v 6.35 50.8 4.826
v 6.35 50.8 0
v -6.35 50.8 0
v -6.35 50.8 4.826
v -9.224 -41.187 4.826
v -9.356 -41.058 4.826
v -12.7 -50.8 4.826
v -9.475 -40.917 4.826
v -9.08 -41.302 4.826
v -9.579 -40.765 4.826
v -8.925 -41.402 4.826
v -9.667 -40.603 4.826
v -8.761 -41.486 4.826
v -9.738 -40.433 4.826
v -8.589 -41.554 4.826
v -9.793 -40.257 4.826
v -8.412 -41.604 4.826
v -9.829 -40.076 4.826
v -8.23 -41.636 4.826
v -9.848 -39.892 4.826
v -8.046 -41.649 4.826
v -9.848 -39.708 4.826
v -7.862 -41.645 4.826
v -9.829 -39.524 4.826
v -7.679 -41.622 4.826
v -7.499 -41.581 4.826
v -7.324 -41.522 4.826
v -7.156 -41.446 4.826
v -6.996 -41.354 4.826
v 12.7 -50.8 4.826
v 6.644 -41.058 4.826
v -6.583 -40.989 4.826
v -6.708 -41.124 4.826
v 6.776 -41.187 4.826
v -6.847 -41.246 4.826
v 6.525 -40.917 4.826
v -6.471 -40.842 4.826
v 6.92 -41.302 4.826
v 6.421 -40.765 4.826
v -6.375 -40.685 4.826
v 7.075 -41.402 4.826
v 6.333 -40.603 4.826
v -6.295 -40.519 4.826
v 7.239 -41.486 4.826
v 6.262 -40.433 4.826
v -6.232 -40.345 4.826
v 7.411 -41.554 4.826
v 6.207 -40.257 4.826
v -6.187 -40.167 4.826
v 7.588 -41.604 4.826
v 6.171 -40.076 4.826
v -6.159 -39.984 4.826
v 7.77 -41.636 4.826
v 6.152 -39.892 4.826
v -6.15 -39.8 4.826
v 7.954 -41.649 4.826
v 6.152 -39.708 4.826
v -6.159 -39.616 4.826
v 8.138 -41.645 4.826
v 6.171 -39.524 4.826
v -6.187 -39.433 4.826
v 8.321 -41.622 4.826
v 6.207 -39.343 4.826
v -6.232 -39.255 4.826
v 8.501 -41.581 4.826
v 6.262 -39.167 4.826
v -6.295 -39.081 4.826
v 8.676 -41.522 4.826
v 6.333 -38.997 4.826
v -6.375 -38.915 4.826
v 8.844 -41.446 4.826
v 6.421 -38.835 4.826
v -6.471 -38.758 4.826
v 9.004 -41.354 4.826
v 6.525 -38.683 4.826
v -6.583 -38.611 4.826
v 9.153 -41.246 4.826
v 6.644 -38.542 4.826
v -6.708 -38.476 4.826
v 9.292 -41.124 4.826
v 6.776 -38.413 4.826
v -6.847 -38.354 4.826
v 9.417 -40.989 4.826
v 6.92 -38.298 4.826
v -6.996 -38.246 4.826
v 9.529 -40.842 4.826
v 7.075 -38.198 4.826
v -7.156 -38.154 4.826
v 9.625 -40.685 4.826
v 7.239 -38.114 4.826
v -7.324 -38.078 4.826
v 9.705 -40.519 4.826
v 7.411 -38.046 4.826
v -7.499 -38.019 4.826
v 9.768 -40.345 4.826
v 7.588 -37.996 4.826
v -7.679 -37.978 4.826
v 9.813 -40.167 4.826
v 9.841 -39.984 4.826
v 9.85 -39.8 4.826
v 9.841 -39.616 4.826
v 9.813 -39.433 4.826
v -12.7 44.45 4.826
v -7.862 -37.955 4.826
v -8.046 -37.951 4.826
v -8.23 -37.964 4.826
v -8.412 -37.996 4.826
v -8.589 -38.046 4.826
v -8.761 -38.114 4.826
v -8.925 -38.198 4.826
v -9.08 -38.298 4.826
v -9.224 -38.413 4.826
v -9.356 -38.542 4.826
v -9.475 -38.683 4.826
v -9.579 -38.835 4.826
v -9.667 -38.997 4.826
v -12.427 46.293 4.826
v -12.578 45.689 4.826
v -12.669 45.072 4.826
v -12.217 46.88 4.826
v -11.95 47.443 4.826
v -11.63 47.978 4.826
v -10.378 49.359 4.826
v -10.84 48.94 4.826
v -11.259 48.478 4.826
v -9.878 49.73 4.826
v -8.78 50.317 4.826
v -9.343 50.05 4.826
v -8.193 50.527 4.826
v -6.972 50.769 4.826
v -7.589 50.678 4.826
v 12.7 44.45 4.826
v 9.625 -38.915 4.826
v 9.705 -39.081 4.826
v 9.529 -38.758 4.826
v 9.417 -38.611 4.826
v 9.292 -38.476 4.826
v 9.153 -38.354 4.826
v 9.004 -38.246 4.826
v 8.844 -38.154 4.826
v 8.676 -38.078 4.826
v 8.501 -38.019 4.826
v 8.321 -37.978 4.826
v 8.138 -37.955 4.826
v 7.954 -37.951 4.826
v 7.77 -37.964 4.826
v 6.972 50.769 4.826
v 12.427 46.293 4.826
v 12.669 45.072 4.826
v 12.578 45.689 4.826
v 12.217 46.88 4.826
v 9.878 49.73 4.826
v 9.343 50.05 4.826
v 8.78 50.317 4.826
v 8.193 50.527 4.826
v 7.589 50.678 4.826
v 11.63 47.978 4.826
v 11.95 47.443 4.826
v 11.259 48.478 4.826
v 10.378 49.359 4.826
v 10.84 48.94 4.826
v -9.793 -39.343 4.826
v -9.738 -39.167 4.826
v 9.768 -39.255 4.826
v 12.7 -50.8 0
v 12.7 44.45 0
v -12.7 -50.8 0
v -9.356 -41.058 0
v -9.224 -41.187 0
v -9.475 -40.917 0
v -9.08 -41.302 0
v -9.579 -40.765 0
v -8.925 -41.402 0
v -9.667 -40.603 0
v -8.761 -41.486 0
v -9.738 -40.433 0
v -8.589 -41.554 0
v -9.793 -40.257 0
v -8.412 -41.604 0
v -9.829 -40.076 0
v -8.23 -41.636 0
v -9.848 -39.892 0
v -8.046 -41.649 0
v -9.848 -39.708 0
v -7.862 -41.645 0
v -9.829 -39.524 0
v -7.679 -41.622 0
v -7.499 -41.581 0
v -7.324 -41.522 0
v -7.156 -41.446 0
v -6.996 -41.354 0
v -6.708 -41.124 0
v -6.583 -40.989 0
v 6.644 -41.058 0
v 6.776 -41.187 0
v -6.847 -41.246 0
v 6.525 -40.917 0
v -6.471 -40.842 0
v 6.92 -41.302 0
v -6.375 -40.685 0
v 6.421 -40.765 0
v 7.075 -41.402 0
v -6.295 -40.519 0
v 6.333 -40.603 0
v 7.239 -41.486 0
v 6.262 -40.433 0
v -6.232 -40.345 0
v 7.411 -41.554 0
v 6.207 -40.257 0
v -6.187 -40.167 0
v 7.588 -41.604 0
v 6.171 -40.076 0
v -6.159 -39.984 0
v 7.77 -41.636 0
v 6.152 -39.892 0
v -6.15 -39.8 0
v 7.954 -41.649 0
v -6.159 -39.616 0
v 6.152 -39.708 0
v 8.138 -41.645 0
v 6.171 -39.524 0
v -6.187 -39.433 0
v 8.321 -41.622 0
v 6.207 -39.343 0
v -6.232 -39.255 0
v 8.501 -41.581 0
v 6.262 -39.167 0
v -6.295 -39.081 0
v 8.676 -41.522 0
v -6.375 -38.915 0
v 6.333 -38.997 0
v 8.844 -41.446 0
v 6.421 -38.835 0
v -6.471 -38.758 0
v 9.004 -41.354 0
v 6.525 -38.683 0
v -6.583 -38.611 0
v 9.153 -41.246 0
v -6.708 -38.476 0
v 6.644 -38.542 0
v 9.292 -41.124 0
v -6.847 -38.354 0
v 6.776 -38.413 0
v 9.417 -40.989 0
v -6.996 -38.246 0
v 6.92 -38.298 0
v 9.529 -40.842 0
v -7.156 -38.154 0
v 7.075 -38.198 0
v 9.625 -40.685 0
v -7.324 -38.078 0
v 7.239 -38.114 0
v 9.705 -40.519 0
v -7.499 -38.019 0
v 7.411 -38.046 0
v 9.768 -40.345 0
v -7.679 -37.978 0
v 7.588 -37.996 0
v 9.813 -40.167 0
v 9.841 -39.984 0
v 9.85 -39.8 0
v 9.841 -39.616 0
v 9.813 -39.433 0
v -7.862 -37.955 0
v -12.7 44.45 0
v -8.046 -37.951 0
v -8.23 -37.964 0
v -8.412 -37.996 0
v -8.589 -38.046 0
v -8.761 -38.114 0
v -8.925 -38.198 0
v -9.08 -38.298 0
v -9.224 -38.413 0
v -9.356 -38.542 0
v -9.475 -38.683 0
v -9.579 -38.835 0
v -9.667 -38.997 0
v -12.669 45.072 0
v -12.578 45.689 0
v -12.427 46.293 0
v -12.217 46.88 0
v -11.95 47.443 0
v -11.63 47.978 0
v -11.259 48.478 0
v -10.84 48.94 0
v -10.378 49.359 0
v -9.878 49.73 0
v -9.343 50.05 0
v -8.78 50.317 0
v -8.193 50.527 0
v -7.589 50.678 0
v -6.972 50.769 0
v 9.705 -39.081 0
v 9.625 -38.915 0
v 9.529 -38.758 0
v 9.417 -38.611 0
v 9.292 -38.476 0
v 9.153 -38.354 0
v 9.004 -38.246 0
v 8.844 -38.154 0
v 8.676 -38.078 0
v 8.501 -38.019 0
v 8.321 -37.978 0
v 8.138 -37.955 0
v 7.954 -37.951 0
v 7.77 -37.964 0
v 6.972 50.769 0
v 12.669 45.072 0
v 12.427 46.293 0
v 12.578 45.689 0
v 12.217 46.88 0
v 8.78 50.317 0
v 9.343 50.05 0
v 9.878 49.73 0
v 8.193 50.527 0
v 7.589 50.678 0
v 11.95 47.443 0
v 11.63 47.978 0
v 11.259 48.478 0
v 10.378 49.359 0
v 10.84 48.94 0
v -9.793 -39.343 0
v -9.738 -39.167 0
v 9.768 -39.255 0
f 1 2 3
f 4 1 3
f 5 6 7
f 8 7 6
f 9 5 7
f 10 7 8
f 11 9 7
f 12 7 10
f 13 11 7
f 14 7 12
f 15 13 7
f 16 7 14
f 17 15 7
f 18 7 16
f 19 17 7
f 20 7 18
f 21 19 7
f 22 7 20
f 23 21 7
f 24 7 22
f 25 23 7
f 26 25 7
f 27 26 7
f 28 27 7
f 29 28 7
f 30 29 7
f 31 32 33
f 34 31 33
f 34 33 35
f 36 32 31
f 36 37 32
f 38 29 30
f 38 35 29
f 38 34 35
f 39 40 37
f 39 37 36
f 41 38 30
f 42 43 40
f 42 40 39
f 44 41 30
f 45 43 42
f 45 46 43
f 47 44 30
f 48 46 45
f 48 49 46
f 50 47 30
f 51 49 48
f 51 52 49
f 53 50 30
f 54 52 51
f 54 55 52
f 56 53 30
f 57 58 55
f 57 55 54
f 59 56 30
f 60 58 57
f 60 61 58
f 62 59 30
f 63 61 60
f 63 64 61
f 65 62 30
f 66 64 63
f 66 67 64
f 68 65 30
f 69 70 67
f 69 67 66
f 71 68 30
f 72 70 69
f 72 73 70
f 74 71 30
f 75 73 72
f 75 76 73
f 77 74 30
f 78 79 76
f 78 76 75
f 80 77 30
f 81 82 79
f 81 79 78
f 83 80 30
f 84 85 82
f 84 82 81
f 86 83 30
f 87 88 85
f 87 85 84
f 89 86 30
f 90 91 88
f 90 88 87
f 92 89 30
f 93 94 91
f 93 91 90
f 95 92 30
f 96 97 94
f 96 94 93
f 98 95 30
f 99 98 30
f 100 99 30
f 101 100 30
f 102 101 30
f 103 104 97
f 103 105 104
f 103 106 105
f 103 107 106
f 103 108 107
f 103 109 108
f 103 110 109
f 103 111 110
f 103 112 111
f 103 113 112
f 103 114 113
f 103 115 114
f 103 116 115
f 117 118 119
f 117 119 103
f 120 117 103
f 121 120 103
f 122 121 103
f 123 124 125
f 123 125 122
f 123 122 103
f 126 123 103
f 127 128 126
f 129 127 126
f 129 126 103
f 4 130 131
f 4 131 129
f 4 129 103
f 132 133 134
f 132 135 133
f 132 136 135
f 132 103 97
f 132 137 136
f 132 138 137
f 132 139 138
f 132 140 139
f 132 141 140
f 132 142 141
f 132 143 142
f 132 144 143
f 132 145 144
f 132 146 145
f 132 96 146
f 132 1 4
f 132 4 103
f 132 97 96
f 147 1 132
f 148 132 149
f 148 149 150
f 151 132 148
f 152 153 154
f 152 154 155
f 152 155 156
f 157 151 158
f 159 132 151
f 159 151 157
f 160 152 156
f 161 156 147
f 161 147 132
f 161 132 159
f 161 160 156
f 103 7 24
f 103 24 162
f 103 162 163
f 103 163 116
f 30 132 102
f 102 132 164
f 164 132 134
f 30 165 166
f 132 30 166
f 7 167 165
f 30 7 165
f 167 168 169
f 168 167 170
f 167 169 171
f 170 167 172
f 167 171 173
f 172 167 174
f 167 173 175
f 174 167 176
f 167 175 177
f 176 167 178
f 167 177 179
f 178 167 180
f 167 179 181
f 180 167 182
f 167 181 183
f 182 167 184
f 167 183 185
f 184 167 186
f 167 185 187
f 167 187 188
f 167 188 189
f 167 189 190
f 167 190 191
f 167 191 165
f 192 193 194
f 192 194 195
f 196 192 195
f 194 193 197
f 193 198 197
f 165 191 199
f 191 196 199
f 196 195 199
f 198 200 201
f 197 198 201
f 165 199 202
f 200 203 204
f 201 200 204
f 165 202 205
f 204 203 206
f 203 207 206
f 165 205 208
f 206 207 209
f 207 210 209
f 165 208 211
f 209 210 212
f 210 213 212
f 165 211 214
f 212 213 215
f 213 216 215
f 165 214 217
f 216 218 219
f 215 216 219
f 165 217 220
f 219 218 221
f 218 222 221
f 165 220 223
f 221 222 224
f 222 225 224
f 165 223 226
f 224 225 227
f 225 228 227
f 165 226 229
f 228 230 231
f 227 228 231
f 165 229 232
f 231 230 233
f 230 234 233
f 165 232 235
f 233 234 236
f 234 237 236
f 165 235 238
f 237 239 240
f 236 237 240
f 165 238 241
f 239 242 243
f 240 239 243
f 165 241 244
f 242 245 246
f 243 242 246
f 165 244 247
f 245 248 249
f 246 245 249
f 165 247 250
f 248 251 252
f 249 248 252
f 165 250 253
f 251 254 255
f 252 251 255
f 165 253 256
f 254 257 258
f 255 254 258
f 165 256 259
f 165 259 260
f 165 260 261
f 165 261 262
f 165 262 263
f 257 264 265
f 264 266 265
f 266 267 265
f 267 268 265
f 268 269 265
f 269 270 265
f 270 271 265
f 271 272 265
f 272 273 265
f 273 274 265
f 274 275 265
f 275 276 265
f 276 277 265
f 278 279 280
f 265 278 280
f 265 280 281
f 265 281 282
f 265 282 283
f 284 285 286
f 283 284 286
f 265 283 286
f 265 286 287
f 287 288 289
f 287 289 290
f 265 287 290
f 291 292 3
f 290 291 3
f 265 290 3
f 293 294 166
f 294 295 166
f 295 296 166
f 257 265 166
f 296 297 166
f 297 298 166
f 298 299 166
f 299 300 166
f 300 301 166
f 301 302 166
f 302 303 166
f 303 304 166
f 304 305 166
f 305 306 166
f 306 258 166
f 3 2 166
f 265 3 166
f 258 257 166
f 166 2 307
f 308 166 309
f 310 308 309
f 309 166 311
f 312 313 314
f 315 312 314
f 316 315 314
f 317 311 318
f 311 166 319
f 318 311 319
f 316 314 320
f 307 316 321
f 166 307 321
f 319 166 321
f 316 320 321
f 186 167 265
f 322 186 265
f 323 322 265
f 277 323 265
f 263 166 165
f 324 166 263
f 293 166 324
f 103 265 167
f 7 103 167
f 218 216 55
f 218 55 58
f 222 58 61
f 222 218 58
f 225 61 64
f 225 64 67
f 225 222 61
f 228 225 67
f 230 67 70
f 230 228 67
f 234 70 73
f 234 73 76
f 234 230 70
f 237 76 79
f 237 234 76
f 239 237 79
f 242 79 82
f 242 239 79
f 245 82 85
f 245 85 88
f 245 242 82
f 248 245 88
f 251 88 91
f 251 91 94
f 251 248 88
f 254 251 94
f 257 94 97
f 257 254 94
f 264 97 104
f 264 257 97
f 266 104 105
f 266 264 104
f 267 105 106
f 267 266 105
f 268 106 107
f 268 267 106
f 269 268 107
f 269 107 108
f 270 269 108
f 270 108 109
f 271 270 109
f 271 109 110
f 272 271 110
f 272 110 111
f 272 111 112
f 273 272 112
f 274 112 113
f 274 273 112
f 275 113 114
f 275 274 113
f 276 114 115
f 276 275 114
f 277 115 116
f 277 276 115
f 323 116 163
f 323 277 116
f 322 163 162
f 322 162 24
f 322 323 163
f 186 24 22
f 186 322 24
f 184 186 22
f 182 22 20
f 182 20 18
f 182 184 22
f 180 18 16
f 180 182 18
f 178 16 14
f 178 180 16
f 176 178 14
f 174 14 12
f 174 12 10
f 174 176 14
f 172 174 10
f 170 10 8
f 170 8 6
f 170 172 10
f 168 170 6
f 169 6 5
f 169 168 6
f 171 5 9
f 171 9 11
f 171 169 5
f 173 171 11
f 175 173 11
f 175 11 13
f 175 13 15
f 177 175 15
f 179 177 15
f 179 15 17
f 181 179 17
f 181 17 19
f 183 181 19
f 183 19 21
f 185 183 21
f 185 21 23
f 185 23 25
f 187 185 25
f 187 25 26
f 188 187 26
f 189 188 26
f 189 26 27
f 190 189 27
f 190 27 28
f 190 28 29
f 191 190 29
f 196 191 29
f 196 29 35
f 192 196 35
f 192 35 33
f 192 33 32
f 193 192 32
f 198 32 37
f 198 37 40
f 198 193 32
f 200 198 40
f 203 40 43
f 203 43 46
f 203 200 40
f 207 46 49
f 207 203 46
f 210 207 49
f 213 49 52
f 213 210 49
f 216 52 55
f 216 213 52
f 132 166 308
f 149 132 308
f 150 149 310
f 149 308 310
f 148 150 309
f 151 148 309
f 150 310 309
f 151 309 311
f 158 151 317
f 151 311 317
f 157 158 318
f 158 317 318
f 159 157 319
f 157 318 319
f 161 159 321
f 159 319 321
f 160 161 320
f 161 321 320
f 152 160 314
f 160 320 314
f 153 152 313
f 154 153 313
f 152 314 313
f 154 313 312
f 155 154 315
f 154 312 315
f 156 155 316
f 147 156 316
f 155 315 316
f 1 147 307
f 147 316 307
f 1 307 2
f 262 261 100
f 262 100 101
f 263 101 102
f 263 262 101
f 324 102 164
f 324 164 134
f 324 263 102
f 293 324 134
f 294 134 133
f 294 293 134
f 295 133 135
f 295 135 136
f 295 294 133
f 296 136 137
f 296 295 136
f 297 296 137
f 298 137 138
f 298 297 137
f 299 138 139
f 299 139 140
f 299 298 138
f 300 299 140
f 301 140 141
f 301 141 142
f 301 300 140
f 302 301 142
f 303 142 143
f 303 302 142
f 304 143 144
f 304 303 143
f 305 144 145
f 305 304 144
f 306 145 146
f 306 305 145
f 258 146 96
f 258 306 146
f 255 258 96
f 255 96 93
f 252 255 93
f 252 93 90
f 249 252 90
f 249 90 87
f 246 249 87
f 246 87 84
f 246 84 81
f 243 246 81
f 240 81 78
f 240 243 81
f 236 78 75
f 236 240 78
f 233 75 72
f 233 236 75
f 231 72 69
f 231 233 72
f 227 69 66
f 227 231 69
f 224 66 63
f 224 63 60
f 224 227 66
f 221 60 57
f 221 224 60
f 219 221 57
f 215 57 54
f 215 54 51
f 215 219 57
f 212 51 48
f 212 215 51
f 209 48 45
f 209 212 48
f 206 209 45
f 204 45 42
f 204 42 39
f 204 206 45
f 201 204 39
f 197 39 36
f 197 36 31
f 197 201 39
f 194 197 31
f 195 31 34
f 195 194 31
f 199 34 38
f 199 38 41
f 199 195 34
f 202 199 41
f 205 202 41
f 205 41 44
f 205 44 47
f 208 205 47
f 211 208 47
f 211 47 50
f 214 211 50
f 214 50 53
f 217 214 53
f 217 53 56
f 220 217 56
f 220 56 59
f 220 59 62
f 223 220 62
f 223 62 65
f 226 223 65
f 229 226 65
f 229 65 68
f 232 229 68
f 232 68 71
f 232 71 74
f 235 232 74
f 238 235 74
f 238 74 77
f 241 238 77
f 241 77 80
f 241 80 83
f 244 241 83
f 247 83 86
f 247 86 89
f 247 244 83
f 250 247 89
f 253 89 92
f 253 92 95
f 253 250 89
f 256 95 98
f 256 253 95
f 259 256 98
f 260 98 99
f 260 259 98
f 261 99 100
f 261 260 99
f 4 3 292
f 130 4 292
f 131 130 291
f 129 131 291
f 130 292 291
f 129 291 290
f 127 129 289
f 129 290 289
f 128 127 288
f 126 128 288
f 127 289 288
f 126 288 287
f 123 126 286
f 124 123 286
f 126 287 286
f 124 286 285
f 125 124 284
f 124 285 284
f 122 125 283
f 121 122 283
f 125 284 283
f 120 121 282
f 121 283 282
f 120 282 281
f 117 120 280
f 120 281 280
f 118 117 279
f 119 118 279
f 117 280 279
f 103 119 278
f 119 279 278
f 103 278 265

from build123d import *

# Parameters (mm, degrees)
F0_R     = 1.85
F1_DEPTH = 4.826


with BuildPart() as f1:
    # F0 (on Top) → F1 (new body)
    with BuildSketch(Plane.XY):
        with BuildLine():
            Line((0, 50.8), (-6.35, 50.8))
            ThreePointArc((-6.35, 50.8), (-10.840128, 48.940128), (-12.7, 44.45))
            Line((-12.7, 44.45), (-12.7, -50.8))
            add(Edge.make_bspline(
                [(0, 50.8), (-12.7, 50.8), (-12.7, -12.351775), (-12.7, -50.8)],
                knots=[0, 0, 0, 0, 102.390673, 102.390673, 102.390673, 102.390673], degree=3))
        make_face()
        with BuildLine():
            add(Edge.make_bspline(
                [(0, 50.8), (12.7, 50.8), (12.7, -12.351775), (12.7, -50.8)],
                knots=[0, 0, 0, 0, 102.390673, 102.390673, 102.390673, 102.390673], degree=3))
            add(Edge.make_bspline(
                [(0, 50.8), (-12.7, 50.8), (-12.7, -12.351775), (-12.7, -50.8)],
                knots=[0, 0, 0, 0, 102.390673, 102.390673, 102.390673, 102.390673], degree=3))
            Line((-12.7, -50.8), (12.7, -50.8))
        make_face()
        with Locations((-8, -39.8)):
            Circle(F0_R, mode=Mode.SUBTRACT)
        with Locations((8, -39.8)):
            Circle(F0_R, mode=Mode.SUBTRACT)
        with BuildLine():
            Line((6.35, 50.8), (0, 50.8))
            add(Edge.make_bspline(
                [(0, 50.8), (12.7, 50.8), (12.7, -12.351775), (12.7, -50.8)],
                knots=[0, 0, 0, 0, 102.390673, 102.390673, 102.390673, 102.390673], degree=3))
            Line((12.7, -50.8), (12.7, 44.45))
            ThreePointArc((12.7, 44.45), (10.840128, 48.940128), (6.35, 50.8))
        make_face()
    extrude(amount=F1_DEPTH)


solid = f1.part
